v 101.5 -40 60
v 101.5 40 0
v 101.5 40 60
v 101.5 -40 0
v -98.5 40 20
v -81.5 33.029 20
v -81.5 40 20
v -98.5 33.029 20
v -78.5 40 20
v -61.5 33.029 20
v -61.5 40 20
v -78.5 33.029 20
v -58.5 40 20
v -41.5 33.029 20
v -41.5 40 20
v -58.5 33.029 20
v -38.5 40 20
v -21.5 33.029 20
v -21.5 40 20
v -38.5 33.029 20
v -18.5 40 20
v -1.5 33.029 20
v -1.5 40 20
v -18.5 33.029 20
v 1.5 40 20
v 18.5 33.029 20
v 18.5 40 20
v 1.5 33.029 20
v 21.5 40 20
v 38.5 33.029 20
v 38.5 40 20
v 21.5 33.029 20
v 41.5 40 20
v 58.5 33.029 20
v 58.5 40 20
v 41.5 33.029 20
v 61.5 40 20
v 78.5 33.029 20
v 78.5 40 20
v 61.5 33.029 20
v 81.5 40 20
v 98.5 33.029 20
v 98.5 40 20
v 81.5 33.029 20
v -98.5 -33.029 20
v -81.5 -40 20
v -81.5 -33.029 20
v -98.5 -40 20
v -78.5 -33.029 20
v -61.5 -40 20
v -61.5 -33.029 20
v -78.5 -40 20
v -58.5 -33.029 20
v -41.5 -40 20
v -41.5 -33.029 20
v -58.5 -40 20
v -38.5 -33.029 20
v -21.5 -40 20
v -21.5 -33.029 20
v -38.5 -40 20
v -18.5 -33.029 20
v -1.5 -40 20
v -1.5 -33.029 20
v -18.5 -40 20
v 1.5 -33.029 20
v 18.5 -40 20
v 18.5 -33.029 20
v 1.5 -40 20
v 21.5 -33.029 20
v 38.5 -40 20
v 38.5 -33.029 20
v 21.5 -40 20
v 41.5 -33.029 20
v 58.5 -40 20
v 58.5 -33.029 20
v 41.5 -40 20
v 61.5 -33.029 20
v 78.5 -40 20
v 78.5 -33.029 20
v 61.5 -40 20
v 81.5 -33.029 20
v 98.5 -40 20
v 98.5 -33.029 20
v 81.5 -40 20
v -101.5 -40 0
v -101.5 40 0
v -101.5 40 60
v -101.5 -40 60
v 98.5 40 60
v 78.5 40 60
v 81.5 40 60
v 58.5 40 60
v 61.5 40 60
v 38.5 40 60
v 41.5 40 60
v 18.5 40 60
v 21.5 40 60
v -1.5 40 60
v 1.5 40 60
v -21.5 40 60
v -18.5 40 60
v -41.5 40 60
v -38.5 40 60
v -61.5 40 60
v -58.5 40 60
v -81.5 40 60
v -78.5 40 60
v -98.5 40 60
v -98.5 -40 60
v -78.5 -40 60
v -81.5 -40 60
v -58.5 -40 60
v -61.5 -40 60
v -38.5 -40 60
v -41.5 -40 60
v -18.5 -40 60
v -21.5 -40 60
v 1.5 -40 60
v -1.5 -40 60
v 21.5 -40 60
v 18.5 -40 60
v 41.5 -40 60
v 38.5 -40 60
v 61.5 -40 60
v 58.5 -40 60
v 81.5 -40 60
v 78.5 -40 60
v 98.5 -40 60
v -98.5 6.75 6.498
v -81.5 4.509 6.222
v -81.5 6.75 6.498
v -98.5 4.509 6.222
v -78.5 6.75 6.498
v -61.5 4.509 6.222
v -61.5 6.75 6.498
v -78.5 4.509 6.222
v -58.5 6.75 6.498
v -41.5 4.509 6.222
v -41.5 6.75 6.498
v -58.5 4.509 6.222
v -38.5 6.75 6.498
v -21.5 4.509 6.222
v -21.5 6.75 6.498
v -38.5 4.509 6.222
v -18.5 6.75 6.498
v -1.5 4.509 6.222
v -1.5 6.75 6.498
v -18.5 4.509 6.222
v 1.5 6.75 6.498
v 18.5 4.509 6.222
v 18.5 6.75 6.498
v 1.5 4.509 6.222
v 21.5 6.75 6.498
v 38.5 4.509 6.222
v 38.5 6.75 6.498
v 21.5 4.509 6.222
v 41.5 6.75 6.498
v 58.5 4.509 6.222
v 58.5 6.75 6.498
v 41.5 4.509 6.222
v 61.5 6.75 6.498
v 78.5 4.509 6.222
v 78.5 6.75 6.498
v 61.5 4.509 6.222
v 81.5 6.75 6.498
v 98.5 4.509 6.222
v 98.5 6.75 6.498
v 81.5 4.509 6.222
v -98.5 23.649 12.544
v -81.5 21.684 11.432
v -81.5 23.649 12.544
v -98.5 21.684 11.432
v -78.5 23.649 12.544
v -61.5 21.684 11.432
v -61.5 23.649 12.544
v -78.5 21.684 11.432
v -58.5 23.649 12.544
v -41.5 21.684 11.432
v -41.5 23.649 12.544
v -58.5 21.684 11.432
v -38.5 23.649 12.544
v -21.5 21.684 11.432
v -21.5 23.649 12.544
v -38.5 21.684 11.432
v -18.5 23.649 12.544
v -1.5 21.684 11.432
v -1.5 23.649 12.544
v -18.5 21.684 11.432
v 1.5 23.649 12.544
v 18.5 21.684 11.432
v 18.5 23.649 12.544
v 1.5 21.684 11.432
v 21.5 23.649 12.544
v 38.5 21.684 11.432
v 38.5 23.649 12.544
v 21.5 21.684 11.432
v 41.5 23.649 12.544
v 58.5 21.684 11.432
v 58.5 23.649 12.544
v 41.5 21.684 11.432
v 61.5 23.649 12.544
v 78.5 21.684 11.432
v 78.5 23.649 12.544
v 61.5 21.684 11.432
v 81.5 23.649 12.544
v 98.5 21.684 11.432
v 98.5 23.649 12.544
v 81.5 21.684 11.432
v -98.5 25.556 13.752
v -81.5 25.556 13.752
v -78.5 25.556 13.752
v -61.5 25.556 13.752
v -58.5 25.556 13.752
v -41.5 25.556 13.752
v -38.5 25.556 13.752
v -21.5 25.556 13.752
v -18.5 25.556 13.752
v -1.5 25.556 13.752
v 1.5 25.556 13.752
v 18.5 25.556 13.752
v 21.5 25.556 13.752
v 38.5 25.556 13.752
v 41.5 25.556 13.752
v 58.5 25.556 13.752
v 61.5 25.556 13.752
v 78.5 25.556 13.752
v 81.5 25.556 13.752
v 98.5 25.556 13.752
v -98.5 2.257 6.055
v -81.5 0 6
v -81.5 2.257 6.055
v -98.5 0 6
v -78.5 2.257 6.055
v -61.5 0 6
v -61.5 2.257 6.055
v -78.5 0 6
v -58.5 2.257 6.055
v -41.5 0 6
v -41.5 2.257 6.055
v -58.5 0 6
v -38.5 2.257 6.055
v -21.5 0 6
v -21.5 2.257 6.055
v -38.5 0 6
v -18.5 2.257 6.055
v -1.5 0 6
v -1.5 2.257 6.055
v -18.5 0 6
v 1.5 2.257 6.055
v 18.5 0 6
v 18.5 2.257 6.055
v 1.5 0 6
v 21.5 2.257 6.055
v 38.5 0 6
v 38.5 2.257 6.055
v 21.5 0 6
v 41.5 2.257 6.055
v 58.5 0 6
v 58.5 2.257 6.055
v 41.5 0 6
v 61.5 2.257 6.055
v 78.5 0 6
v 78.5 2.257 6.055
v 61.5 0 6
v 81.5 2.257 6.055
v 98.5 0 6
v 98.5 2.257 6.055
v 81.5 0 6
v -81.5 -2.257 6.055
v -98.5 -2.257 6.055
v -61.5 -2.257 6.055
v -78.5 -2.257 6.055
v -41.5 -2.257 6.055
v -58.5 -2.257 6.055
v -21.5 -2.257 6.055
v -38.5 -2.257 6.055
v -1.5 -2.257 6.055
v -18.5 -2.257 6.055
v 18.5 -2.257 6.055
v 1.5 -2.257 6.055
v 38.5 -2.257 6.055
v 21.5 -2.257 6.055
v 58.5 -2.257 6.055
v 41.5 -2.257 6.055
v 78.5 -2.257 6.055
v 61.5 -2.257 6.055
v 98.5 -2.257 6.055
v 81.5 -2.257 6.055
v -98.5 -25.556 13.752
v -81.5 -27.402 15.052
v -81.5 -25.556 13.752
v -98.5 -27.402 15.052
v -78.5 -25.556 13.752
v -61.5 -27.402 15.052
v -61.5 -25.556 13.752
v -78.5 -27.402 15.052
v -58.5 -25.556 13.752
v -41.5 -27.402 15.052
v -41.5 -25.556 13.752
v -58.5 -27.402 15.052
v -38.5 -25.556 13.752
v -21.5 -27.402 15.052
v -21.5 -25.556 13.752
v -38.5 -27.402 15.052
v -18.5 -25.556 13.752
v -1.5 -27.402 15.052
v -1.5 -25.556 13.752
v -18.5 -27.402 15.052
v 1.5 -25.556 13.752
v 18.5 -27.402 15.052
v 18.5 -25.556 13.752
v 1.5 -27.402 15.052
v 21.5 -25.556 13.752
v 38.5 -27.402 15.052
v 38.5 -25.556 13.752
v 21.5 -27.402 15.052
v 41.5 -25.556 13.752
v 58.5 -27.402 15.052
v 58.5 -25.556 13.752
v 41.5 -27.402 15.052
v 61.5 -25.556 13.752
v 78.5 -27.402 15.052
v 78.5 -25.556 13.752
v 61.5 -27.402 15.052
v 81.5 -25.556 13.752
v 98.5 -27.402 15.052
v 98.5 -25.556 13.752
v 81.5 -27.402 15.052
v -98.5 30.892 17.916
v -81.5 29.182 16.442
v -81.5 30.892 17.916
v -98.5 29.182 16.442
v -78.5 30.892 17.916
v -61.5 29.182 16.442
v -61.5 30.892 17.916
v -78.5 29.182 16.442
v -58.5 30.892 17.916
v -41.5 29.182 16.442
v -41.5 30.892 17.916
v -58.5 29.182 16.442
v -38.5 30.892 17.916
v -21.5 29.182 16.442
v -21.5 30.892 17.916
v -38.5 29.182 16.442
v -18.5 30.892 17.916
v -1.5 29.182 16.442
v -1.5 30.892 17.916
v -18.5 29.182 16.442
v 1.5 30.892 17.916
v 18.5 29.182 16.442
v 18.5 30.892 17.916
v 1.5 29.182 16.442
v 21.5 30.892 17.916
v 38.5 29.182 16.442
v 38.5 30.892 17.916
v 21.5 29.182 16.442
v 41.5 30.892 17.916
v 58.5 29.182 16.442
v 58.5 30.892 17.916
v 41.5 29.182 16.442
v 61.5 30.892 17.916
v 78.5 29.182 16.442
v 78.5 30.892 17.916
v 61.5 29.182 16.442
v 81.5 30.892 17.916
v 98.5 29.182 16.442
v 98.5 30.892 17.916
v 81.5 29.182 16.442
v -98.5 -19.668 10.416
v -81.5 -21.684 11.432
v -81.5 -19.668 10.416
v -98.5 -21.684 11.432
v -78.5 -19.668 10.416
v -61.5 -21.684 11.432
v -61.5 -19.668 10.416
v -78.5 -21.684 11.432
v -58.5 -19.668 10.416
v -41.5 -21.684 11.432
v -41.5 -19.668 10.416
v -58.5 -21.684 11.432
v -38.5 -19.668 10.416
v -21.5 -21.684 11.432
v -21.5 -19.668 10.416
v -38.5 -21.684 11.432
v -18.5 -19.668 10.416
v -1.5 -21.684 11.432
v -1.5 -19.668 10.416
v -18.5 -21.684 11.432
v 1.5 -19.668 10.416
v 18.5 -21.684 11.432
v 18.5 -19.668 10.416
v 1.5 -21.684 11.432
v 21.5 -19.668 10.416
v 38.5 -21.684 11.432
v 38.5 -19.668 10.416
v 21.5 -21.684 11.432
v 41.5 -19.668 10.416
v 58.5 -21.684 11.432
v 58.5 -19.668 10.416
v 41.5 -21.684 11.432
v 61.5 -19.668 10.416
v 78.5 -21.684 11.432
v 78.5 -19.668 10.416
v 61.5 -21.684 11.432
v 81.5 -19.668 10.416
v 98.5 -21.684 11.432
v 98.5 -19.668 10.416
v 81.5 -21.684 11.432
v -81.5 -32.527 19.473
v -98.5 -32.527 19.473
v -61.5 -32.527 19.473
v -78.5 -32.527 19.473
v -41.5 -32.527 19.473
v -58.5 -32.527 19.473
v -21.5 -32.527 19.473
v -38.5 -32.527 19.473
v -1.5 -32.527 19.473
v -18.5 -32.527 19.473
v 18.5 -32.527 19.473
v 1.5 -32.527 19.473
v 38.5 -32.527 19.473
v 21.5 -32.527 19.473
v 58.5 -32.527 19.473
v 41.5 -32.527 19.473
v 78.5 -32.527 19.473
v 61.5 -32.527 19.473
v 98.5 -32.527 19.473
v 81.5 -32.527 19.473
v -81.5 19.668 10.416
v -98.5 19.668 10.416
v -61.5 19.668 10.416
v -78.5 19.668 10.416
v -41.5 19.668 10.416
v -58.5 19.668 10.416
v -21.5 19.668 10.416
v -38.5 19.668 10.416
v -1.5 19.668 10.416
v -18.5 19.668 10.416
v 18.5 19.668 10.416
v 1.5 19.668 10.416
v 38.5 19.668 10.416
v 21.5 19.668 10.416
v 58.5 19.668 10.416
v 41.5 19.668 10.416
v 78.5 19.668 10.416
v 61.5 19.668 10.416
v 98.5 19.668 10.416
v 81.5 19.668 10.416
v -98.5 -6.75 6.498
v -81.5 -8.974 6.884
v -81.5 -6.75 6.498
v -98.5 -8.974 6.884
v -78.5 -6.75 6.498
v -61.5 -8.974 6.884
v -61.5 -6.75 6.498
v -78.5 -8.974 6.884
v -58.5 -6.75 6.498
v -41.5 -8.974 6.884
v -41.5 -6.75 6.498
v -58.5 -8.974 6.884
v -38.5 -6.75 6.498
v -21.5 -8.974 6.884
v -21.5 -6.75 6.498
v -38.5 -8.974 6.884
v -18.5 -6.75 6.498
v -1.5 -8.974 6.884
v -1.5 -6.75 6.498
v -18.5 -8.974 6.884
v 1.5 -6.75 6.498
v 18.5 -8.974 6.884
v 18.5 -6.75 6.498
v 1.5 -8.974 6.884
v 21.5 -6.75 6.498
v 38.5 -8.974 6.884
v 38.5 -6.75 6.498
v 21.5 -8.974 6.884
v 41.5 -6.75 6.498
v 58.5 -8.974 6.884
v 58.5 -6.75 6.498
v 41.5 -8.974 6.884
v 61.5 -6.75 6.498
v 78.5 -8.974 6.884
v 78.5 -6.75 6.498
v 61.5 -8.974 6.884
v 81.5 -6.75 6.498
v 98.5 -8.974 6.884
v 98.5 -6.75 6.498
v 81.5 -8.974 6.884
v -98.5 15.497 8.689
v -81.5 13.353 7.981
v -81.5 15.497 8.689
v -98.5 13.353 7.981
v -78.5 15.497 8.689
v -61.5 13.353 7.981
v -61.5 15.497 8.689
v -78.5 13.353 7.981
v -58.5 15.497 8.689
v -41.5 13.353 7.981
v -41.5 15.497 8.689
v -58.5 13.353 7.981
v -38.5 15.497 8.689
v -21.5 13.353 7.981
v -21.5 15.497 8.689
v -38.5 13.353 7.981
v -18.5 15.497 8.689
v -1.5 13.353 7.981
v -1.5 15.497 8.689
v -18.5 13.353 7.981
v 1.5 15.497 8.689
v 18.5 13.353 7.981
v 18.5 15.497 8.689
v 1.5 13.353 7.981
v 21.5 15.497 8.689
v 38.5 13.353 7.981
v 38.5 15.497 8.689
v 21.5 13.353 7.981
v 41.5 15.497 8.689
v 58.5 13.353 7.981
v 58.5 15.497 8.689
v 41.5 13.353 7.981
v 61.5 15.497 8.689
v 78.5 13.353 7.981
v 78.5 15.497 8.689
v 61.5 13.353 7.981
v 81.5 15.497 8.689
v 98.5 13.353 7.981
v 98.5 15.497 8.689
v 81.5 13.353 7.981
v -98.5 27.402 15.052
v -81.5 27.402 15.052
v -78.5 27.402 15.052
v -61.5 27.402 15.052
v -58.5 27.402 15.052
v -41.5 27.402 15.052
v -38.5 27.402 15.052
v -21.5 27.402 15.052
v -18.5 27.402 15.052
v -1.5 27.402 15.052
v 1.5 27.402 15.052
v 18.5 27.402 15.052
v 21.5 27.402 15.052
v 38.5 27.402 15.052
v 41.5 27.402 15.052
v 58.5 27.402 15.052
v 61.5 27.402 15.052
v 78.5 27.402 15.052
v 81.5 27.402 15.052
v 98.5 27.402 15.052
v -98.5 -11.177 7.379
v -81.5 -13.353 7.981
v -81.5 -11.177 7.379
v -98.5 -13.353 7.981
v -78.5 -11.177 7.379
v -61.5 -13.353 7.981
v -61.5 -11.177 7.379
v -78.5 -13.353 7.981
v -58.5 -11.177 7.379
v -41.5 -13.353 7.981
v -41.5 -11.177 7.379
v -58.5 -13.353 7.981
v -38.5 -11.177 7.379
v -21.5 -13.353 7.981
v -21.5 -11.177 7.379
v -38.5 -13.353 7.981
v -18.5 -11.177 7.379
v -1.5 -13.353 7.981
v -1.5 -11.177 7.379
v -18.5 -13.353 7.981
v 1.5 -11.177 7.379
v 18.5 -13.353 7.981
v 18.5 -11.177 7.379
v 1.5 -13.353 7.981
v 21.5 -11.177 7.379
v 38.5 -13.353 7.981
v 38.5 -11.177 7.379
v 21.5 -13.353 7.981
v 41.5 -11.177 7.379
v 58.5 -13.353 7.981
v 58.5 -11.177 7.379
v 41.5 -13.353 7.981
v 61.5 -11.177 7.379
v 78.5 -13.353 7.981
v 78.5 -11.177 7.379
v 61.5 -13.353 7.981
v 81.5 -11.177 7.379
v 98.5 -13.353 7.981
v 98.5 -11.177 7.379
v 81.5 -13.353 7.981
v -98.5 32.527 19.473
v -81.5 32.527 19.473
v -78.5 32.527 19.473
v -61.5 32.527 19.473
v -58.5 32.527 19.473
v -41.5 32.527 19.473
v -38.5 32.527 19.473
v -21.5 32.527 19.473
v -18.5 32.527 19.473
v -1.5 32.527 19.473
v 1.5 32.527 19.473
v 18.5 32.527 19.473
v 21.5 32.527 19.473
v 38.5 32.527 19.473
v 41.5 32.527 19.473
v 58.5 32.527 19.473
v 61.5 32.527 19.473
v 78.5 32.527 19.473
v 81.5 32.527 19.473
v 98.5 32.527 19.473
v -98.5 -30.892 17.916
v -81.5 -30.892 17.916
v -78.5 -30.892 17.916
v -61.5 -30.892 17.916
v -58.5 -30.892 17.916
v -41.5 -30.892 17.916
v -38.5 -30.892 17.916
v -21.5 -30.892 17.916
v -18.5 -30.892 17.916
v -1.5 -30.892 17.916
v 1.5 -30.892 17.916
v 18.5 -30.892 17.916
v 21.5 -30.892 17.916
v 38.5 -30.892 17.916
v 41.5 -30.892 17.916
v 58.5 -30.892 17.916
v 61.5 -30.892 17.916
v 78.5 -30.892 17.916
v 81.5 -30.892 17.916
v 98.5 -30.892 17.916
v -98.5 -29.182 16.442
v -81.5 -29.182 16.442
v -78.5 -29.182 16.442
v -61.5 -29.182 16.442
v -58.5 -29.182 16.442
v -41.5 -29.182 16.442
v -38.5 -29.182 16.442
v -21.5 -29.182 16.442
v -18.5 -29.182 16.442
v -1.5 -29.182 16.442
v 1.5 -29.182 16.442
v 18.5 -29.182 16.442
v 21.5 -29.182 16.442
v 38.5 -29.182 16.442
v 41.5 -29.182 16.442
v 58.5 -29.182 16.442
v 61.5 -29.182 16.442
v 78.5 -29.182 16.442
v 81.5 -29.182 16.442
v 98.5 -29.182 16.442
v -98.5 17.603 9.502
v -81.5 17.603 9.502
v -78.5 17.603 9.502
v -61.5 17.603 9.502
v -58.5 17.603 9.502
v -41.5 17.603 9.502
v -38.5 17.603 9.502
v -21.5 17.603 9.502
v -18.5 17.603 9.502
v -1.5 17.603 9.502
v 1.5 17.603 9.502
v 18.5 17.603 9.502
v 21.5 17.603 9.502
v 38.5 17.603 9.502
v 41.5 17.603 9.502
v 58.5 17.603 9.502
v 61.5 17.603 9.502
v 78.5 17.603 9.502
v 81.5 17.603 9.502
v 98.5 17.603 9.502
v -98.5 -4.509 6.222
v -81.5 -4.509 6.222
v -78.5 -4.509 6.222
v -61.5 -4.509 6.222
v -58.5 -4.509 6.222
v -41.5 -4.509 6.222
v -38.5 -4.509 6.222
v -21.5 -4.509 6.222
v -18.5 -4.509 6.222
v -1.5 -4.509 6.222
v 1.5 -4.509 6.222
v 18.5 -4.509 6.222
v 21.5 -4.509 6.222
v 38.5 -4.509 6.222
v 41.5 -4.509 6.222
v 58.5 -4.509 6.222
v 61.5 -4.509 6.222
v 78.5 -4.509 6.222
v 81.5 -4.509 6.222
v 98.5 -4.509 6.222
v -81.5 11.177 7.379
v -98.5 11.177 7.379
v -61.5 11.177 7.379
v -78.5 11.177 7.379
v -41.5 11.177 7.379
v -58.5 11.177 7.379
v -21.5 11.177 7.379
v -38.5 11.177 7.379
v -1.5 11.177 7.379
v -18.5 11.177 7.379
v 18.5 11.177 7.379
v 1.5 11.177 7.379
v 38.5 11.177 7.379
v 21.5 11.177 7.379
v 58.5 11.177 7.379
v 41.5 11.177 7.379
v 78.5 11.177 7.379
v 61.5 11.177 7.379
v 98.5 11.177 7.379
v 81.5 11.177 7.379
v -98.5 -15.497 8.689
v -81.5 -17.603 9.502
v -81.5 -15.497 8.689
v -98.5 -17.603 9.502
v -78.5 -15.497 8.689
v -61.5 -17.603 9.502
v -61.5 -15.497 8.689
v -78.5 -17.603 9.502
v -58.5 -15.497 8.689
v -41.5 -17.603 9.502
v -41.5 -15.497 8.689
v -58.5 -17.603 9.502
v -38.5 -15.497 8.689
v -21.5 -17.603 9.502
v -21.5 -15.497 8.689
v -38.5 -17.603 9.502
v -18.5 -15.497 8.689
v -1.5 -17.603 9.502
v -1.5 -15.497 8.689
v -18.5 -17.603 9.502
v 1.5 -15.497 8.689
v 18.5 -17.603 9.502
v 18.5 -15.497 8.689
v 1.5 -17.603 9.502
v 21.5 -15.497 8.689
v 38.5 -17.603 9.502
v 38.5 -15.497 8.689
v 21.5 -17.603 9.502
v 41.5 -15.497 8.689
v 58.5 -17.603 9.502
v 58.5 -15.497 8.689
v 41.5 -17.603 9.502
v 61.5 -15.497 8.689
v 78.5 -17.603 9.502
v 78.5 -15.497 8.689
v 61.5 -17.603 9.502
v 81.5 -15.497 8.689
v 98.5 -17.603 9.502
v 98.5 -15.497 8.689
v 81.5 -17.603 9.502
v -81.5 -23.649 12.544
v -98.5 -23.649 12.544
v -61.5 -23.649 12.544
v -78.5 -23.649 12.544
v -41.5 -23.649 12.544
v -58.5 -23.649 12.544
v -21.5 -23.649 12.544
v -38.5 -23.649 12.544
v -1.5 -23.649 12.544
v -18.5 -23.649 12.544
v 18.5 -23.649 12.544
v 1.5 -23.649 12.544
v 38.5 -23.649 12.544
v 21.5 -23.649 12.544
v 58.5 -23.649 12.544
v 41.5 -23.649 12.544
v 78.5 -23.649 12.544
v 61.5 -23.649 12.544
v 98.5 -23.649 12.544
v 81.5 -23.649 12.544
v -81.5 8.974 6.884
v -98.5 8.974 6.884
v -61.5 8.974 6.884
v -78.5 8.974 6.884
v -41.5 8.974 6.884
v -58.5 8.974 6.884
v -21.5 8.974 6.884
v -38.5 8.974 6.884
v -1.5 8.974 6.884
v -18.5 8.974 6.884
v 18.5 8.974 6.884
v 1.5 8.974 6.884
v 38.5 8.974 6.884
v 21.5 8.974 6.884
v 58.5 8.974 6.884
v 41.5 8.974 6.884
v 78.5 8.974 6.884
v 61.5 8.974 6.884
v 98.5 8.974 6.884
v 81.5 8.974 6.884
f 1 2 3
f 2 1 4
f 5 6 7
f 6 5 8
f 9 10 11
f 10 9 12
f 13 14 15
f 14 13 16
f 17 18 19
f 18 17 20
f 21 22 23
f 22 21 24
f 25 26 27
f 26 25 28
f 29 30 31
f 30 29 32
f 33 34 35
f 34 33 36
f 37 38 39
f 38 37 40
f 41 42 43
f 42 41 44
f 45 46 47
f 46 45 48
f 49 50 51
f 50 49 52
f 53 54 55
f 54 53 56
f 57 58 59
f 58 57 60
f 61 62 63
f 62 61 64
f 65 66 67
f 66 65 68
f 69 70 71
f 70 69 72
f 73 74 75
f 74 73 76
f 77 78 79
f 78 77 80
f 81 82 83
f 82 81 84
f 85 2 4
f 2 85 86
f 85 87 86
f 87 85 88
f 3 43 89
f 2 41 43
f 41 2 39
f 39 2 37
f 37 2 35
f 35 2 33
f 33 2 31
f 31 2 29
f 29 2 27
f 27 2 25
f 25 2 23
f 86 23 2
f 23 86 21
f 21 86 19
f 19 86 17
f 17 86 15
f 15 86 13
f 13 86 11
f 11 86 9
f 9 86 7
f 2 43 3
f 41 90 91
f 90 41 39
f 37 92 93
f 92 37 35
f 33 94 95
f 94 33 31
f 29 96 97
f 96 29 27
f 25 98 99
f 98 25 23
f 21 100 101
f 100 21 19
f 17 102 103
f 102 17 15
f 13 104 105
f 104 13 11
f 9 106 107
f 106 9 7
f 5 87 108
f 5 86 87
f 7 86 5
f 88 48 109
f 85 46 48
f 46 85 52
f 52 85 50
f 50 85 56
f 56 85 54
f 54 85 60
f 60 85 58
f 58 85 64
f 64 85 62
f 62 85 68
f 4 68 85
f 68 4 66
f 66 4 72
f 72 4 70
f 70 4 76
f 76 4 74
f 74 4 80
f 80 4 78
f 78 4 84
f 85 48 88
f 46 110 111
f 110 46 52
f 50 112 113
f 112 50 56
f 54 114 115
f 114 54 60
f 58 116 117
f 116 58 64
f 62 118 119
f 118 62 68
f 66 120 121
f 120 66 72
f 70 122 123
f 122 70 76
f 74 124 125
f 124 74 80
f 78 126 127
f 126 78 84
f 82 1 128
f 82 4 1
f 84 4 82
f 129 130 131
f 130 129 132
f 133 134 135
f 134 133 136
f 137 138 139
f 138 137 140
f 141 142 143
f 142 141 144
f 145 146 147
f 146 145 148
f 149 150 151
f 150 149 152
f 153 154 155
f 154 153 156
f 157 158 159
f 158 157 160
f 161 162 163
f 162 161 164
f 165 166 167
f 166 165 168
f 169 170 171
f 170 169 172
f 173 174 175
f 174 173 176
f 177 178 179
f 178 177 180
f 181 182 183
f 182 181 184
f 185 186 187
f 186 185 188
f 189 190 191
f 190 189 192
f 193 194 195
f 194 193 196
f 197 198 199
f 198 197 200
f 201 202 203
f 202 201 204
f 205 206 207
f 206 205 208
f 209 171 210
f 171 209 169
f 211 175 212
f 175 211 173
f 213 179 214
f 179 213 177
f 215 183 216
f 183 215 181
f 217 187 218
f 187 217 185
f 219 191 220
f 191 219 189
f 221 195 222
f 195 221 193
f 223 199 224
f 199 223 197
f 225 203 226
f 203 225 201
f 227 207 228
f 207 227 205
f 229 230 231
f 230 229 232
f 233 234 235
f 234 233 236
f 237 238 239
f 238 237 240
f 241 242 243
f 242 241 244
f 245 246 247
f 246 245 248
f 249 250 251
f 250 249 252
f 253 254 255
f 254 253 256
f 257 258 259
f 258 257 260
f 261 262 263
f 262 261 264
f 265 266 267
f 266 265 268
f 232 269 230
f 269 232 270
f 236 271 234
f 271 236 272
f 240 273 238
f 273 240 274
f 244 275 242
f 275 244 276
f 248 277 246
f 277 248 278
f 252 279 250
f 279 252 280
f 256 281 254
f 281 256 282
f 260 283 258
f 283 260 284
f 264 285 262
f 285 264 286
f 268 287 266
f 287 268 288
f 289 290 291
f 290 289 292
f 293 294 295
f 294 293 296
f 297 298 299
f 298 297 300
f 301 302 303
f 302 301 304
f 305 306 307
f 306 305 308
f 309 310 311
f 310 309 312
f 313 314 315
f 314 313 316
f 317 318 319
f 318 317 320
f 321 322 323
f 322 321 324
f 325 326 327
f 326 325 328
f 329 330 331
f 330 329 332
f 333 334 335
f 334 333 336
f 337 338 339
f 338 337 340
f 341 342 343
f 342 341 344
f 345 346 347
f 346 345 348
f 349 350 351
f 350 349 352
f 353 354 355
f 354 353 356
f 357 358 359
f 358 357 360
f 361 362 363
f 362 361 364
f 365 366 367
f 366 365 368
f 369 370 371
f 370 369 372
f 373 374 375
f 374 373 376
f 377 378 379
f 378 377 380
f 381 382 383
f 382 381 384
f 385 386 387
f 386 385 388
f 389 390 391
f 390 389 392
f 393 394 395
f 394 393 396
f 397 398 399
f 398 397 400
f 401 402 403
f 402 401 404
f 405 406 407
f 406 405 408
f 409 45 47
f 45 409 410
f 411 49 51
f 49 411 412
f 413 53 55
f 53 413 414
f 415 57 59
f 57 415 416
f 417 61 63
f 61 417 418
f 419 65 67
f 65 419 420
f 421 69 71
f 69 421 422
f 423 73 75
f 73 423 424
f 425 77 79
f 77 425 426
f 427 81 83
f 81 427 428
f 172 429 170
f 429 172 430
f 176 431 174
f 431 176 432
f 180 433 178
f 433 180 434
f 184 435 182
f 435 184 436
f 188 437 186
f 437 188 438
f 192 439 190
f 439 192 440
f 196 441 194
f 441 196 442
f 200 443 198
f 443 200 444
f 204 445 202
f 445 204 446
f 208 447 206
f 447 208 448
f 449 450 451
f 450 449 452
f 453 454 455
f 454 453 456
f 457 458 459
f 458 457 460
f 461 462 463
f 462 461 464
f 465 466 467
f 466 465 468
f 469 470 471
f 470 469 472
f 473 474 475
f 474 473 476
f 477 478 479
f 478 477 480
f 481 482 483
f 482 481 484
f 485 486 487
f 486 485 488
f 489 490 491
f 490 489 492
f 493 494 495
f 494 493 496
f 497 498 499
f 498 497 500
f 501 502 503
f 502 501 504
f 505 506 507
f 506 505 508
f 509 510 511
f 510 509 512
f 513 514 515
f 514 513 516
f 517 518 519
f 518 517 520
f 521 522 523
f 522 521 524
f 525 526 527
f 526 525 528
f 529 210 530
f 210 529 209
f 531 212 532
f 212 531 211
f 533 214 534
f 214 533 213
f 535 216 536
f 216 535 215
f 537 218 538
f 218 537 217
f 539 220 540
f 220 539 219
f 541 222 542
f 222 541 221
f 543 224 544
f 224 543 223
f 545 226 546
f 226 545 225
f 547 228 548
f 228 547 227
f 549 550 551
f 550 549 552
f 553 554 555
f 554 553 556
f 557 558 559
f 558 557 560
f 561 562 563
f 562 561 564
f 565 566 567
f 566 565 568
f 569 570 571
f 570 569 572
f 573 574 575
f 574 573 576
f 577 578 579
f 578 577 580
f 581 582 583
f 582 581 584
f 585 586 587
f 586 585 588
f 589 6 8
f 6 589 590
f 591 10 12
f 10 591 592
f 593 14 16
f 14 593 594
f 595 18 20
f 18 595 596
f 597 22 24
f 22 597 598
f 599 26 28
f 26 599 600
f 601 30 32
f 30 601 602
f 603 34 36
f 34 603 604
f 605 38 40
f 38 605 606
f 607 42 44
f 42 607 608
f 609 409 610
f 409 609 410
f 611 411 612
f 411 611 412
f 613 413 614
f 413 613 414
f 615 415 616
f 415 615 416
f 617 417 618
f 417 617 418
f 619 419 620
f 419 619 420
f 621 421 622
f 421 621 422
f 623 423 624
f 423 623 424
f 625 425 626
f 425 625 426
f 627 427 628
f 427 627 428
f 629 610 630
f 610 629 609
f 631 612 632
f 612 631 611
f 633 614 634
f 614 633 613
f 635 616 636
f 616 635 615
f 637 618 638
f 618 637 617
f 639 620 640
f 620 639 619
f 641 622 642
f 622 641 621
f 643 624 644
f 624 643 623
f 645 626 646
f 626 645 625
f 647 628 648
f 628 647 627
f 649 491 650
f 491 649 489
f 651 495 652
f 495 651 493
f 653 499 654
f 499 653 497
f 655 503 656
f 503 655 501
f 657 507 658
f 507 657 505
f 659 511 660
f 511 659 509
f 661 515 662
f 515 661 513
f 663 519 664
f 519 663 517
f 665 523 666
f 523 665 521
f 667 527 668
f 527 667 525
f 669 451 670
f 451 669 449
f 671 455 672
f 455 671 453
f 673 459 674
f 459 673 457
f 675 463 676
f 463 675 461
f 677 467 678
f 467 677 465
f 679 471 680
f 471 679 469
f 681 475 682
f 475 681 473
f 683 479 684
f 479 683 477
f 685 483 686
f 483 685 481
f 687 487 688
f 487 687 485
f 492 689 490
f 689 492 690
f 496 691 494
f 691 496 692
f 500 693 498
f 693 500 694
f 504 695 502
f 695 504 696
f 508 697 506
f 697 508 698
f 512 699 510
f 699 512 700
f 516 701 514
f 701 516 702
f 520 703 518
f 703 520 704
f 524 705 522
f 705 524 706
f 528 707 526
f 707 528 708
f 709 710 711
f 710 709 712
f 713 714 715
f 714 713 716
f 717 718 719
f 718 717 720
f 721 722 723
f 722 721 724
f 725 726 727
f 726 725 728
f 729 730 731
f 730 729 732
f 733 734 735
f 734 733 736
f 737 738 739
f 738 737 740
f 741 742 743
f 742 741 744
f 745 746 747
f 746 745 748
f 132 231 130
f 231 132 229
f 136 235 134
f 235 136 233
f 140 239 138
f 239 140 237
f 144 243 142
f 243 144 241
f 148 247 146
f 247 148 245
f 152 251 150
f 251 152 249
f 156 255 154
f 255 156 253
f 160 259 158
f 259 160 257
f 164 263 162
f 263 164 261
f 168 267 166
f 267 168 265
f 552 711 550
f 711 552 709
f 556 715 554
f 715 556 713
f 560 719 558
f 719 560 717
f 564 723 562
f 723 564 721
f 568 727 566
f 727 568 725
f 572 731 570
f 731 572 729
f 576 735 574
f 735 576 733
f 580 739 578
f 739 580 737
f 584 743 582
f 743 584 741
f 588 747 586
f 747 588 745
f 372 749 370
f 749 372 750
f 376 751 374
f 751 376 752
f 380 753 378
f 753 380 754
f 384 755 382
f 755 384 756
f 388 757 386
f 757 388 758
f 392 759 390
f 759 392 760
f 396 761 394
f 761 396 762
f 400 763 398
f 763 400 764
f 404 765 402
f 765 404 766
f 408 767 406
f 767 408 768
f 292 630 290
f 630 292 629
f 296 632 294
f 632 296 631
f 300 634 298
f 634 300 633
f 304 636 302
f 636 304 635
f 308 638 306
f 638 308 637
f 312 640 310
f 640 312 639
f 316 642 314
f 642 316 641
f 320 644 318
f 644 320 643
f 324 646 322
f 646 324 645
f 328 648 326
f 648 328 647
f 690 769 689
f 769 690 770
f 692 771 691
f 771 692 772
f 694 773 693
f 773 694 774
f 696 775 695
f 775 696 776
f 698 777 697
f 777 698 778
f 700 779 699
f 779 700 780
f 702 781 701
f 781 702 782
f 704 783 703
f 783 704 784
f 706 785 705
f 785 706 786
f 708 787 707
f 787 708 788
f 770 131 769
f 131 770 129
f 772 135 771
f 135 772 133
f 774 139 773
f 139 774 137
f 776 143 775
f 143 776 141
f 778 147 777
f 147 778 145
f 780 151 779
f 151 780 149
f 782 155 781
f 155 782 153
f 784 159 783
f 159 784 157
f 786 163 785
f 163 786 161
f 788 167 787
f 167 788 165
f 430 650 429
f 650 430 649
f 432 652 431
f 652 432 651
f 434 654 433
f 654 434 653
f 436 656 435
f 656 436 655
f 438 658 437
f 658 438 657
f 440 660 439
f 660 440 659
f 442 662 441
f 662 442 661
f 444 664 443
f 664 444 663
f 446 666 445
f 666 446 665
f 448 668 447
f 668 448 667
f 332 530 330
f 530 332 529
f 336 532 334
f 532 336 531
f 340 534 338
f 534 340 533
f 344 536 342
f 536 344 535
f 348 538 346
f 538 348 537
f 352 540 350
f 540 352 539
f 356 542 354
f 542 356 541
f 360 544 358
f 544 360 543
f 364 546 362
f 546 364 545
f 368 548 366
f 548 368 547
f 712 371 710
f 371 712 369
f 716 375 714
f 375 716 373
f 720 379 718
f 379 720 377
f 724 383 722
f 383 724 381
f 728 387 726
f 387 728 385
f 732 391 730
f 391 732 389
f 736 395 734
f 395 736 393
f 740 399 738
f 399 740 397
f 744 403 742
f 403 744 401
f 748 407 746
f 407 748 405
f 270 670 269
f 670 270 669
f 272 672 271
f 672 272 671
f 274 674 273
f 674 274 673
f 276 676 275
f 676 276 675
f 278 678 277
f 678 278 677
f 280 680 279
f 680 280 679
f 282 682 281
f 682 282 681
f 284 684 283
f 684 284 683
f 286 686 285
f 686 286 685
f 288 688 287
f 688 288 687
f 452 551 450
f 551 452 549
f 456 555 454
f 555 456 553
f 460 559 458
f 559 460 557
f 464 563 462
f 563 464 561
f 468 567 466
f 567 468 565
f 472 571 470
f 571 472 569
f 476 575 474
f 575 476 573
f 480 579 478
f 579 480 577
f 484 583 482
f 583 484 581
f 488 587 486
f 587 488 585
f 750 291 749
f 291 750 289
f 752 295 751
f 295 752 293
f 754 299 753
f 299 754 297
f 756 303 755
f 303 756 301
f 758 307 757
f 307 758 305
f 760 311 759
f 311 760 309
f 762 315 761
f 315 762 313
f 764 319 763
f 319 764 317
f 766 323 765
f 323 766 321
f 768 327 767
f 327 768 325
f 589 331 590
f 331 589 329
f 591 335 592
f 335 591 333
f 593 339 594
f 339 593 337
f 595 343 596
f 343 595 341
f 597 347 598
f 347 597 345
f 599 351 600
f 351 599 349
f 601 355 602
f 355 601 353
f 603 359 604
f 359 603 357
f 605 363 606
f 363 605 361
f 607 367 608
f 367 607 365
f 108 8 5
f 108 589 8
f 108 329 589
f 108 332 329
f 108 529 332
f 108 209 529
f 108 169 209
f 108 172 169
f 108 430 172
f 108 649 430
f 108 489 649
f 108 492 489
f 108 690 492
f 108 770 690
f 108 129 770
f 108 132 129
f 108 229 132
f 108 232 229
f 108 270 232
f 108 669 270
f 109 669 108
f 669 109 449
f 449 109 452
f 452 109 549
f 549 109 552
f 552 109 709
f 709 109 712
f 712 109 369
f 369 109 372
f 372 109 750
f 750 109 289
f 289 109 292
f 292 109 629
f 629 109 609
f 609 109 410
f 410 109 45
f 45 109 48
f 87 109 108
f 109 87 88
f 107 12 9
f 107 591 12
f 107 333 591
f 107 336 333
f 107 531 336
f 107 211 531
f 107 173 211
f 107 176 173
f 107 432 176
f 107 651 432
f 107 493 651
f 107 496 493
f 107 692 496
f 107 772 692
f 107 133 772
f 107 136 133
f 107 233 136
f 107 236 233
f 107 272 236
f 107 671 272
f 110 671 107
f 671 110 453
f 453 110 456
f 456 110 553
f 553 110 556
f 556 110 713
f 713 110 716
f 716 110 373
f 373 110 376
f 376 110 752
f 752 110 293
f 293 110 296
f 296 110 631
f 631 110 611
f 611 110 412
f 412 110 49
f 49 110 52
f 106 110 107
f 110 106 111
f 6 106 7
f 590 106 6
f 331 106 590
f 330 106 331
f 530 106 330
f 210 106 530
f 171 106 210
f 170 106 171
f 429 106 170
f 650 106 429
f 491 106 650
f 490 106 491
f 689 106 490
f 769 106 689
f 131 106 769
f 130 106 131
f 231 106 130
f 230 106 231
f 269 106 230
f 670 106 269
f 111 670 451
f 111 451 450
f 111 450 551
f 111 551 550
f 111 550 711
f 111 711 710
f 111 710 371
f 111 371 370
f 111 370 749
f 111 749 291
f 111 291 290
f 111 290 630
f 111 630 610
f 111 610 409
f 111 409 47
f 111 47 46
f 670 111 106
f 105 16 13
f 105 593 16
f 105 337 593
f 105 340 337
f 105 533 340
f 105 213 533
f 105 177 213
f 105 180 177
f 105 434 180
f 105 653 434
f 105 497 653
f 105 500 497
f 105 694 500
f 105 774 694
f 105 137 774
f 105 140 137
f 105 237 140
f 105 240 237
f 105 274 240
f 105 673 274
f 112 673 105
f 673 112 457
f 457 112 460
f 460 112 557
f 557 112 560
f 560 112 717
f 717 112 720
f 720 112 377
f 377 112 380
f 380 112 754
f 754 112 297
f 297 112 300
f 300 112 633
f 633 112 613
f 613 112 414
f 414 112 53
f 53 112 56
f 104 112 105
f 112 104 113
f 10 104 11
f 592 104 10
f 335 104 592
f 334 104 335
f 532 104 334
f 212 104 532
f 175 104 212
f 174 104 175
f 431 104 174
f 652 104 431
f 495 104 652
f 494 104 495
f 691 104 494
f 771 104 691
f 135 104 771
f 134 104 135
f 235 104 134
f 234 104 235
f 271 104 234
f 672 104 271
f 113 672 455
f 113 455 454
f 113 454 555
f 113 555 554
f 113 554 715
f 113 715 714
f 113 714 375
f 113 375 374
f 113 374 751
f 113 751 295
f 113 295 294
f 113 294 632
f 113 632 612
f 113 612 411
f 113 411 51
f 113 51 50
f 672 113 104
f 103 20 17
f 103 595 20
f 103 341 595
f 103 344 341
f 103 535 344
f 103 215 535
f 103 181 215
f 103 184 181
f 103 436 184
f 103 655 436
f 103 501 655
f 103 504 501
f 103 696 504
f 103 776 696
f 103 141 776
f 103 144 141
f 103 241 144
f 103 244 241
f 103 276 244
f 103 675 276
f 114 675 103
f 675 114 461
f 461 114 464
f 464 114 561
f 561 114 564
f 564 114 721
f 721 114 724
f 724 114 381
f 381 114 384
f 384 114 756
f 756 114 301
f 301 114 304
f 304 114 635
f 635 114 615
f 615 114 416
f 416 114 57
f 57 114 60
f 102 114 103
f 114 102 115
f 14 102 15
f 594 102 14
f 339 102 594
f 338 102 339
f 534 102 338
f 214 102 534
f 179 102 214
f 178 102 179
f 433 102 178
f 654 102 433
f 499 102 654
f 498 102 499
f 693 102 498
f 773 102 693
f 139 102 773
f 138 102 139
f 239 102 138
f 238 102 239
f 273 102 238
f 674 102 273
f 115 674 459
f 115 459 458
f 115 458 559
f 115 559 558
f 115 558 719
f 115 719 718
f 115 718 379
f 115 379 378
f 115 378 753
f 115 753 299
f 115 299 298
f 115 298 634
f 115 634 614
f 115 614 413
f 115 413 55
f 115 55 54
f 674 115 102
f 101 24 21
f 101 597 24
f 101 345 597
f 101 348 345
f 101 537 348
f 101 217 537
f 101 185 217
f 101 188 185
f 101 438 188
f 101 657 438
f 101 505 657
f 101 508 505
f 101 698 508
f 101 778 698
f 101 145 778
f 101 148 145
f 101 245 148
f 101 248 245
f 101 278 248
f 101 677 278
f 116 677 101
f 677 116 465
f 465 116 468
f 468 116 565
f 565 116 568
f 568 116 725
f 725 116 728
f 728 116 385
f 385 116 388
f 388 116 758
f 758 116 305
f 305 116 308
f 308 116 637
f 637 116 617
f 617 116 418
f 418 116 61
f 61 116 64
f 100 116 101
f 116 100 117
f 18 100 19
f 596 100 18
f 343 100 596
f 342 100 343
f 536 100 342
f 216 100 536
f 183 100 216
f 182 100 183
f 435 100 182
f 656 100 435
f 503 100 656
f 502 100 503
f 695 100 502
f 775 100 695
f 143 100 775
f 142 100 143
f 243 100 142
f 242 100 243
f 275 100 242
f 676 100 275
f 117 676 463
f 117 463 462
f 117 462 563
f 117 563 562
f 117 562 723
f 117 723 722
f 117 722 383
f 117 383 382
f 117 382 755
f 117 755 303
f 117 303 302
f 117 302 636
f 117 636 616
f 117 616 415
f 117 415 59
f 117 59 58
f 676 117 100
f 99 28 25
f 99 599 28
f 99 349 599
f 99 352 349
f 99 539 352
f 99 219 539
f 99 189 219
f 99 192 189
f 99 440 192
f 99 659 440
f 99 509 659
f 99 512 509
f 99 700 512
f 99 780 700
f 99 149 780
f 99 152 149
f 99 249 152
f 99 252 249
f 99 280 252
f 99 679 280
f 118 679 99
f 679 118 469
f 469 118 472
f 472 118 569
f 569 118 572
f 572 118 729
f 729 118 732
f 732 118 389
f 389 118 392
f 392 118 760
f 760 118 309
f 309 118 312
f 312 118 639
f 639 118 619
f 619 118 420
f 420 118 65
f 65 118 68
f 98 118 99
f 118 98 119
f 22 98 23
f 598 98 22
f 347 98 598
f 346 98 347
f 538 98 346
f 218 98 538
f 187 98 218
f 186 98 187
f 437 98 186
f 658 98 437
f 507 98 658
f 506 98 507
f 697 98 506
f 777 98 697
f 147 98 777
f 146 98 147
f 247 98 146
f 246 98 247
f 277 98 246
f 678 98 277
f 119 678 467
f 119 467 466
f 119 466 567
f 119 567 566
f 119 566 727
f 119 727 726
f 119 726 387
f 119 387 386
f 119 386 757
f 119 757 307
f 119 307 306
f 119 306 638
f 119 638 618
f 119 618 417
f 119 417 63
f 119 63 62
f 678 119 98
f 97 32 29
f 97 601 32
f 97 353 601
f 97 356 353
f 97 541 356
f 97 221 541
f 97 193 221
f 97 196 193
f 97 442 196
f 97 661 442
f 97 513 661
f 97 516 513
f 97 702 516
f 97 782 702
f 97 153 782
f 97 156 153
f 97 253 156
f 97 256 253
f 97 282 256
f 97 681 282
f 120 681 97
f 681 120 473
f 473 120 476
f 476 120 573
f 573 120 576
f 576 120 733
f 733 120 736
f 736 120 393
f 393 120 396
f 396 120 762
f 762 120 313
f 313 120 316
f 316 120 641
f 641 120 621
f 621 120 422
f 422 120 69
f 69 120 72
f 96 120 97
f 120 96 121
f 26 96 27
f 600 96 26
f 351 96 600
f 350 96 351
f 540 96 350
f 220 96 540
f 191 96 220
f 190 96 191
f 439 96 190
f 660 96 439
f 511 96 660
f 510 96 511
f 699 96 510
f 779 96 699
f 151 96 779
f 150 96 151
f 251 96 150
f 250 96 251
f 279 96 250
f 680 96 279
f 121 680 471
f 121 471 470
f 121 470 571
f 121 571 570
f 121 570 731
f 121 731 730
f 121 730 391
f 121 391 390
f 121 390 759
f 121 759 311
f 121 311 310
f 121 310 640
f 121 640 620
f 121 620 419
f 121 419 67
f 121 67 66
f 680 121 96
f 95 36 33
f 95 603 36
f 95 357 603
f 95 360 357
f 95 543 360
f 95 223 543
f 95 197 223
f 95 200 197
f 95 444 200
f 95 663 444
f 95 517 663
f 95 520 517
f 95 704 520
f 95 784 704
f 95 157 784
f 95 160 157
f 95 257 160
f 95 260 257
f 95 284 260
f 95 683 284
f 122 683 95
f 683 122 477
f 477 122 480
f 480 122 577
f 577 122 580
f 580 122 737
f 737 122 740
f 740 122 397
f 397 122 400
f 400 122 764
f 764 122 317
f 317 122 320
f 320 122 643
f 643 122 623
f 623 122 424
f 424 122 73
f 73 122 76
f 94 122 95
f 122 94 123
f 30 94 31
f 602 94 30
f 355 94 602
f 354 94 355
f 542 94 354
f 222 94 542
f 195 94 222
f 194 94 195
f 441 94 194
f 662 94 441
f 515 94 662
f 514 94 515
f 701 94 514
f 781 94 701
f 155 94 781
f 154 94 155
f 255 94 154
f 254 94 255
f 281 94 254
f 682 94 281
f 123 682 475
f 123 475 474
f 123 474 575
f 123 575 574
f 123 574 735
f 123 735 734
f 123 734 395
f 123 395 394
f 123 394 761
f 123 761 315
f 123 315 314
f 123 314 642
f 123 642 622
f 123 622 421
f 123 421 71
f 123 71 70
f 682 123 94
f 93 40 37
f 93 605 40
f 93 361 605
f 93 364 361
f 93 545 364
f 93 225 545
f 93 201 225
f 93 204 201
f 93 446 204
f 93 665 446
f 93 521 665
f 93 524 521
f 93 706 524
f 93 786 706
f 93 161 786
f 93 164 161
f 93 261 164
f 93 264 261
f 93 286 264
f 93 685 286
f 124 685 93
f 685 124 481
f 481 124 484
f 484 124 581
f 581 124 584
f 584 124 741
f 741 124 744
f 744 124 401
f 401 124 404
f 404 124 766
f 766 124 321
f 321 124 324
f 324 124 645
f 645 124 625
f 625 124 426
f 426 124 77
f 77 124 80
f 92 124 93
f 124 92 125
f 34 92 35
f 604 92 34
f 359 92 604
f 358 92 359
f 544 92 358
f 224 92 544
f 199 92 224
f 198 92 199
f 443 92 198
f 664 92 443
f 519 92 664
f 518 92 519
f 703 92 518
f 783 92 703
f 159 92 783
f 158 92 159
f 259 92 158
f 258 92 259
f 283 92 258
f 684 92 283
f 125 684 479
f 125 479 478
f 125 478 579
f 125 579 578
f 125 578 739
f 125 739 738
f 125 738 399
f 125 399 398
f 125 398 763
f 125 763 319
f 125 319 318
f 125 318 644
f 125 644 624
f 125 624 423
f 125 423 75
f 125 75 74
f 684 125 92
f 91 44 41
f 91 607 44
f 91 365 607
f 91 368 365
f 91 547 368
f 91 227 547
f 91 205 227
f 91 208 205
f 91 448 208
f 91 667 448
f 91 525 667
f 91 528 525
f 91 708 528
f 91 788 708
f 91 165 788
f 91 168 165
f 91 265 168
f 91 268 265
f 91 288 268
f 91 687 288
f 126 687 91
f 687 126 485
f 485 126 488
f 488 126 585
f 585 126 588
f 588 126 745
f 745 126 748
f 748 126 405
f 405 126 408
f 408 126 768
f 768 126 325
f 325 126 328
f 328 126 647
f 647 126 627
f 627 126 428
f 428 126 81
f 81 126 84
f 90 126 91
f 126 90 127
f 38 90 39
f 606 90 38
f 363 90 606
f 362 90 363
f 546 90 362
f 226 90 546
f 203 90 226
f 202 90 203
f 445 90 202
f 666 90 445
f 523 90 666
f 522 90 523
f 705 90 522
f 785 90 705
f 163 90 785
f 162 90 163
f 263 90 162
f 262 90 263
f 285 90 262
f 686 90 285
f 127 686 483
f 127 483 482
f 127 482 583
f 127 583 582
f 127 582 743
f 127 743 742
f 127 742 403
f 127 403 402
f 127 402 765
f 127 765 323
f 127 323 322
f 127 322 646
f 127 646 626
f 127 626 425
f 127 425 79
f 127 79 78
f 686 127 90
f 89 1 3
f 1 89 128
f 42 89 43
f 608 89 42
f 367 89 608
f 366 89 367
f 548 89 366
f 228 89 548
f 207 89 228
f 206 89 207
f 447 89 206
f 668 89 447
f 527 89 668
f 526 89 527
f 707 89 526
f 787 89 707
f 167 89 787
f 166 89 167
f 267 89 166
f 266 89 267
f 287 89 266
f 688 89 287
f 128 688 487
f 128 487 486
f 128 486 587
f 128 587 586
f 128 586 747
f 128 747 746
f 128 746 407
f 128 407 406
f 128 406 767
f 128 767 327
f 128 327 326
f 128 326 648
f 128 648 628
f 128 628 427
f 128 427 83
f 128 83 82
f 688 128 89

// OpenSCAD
// Petri dish rack - ten 90 mm dishes standing on edge
// Print orientation: as used, base on XY plane

// ---------- Parameters ----------
base_len      = 203;   // base length along X (mm)
base_wid      = 80;    // base width along Y (mm)
base_h        = 20;    // base height (mm)

cradle_r      = 46;    // cradle cylinder radius (mm)
cradle_z      = 52;    // cradle cylinder axis height (mm); bottom at z = 6
cradle_extra  = 1;     // cutter overshoot past base ends (mm)

div_count     = 11;    // number of divider plates
div_pitch     = 20;    // divider spacing along X (mm)
div_t         = 3;     // divider thickness in X (mm)
div_h         = 60;    // divider height (mm)
div_w         = base_wid; // divider width in Y (mm)

$fn = 128;

// ---------- Derived ----------
div_x0 = -(div_count - 1) * div_pitch / 2;   // first divider centre (-100)

// ---------- Model ----------
union() {
    // Base with cylindrical cradle
    difference() {
        translate([-base_len/2, -base_wid/2, 0])
            cube([base_len, base_wid, base_h]);

        translate([-(base_len/2 + cradle_extra), 0, cradle_z])
            rotate([0, 90, 0])
                cylinder(r = cradle_r, h = base_len + 2*cradle_extra);
    }

    // Solid divider plates (cradle not cut through them)
    for (i = [0 : div_count - 1])
        translate([div_x0 + i*div_pitch - div_t/2, -div_w/2, 0])
            cube([div_t, div_w, div_h]);
}
